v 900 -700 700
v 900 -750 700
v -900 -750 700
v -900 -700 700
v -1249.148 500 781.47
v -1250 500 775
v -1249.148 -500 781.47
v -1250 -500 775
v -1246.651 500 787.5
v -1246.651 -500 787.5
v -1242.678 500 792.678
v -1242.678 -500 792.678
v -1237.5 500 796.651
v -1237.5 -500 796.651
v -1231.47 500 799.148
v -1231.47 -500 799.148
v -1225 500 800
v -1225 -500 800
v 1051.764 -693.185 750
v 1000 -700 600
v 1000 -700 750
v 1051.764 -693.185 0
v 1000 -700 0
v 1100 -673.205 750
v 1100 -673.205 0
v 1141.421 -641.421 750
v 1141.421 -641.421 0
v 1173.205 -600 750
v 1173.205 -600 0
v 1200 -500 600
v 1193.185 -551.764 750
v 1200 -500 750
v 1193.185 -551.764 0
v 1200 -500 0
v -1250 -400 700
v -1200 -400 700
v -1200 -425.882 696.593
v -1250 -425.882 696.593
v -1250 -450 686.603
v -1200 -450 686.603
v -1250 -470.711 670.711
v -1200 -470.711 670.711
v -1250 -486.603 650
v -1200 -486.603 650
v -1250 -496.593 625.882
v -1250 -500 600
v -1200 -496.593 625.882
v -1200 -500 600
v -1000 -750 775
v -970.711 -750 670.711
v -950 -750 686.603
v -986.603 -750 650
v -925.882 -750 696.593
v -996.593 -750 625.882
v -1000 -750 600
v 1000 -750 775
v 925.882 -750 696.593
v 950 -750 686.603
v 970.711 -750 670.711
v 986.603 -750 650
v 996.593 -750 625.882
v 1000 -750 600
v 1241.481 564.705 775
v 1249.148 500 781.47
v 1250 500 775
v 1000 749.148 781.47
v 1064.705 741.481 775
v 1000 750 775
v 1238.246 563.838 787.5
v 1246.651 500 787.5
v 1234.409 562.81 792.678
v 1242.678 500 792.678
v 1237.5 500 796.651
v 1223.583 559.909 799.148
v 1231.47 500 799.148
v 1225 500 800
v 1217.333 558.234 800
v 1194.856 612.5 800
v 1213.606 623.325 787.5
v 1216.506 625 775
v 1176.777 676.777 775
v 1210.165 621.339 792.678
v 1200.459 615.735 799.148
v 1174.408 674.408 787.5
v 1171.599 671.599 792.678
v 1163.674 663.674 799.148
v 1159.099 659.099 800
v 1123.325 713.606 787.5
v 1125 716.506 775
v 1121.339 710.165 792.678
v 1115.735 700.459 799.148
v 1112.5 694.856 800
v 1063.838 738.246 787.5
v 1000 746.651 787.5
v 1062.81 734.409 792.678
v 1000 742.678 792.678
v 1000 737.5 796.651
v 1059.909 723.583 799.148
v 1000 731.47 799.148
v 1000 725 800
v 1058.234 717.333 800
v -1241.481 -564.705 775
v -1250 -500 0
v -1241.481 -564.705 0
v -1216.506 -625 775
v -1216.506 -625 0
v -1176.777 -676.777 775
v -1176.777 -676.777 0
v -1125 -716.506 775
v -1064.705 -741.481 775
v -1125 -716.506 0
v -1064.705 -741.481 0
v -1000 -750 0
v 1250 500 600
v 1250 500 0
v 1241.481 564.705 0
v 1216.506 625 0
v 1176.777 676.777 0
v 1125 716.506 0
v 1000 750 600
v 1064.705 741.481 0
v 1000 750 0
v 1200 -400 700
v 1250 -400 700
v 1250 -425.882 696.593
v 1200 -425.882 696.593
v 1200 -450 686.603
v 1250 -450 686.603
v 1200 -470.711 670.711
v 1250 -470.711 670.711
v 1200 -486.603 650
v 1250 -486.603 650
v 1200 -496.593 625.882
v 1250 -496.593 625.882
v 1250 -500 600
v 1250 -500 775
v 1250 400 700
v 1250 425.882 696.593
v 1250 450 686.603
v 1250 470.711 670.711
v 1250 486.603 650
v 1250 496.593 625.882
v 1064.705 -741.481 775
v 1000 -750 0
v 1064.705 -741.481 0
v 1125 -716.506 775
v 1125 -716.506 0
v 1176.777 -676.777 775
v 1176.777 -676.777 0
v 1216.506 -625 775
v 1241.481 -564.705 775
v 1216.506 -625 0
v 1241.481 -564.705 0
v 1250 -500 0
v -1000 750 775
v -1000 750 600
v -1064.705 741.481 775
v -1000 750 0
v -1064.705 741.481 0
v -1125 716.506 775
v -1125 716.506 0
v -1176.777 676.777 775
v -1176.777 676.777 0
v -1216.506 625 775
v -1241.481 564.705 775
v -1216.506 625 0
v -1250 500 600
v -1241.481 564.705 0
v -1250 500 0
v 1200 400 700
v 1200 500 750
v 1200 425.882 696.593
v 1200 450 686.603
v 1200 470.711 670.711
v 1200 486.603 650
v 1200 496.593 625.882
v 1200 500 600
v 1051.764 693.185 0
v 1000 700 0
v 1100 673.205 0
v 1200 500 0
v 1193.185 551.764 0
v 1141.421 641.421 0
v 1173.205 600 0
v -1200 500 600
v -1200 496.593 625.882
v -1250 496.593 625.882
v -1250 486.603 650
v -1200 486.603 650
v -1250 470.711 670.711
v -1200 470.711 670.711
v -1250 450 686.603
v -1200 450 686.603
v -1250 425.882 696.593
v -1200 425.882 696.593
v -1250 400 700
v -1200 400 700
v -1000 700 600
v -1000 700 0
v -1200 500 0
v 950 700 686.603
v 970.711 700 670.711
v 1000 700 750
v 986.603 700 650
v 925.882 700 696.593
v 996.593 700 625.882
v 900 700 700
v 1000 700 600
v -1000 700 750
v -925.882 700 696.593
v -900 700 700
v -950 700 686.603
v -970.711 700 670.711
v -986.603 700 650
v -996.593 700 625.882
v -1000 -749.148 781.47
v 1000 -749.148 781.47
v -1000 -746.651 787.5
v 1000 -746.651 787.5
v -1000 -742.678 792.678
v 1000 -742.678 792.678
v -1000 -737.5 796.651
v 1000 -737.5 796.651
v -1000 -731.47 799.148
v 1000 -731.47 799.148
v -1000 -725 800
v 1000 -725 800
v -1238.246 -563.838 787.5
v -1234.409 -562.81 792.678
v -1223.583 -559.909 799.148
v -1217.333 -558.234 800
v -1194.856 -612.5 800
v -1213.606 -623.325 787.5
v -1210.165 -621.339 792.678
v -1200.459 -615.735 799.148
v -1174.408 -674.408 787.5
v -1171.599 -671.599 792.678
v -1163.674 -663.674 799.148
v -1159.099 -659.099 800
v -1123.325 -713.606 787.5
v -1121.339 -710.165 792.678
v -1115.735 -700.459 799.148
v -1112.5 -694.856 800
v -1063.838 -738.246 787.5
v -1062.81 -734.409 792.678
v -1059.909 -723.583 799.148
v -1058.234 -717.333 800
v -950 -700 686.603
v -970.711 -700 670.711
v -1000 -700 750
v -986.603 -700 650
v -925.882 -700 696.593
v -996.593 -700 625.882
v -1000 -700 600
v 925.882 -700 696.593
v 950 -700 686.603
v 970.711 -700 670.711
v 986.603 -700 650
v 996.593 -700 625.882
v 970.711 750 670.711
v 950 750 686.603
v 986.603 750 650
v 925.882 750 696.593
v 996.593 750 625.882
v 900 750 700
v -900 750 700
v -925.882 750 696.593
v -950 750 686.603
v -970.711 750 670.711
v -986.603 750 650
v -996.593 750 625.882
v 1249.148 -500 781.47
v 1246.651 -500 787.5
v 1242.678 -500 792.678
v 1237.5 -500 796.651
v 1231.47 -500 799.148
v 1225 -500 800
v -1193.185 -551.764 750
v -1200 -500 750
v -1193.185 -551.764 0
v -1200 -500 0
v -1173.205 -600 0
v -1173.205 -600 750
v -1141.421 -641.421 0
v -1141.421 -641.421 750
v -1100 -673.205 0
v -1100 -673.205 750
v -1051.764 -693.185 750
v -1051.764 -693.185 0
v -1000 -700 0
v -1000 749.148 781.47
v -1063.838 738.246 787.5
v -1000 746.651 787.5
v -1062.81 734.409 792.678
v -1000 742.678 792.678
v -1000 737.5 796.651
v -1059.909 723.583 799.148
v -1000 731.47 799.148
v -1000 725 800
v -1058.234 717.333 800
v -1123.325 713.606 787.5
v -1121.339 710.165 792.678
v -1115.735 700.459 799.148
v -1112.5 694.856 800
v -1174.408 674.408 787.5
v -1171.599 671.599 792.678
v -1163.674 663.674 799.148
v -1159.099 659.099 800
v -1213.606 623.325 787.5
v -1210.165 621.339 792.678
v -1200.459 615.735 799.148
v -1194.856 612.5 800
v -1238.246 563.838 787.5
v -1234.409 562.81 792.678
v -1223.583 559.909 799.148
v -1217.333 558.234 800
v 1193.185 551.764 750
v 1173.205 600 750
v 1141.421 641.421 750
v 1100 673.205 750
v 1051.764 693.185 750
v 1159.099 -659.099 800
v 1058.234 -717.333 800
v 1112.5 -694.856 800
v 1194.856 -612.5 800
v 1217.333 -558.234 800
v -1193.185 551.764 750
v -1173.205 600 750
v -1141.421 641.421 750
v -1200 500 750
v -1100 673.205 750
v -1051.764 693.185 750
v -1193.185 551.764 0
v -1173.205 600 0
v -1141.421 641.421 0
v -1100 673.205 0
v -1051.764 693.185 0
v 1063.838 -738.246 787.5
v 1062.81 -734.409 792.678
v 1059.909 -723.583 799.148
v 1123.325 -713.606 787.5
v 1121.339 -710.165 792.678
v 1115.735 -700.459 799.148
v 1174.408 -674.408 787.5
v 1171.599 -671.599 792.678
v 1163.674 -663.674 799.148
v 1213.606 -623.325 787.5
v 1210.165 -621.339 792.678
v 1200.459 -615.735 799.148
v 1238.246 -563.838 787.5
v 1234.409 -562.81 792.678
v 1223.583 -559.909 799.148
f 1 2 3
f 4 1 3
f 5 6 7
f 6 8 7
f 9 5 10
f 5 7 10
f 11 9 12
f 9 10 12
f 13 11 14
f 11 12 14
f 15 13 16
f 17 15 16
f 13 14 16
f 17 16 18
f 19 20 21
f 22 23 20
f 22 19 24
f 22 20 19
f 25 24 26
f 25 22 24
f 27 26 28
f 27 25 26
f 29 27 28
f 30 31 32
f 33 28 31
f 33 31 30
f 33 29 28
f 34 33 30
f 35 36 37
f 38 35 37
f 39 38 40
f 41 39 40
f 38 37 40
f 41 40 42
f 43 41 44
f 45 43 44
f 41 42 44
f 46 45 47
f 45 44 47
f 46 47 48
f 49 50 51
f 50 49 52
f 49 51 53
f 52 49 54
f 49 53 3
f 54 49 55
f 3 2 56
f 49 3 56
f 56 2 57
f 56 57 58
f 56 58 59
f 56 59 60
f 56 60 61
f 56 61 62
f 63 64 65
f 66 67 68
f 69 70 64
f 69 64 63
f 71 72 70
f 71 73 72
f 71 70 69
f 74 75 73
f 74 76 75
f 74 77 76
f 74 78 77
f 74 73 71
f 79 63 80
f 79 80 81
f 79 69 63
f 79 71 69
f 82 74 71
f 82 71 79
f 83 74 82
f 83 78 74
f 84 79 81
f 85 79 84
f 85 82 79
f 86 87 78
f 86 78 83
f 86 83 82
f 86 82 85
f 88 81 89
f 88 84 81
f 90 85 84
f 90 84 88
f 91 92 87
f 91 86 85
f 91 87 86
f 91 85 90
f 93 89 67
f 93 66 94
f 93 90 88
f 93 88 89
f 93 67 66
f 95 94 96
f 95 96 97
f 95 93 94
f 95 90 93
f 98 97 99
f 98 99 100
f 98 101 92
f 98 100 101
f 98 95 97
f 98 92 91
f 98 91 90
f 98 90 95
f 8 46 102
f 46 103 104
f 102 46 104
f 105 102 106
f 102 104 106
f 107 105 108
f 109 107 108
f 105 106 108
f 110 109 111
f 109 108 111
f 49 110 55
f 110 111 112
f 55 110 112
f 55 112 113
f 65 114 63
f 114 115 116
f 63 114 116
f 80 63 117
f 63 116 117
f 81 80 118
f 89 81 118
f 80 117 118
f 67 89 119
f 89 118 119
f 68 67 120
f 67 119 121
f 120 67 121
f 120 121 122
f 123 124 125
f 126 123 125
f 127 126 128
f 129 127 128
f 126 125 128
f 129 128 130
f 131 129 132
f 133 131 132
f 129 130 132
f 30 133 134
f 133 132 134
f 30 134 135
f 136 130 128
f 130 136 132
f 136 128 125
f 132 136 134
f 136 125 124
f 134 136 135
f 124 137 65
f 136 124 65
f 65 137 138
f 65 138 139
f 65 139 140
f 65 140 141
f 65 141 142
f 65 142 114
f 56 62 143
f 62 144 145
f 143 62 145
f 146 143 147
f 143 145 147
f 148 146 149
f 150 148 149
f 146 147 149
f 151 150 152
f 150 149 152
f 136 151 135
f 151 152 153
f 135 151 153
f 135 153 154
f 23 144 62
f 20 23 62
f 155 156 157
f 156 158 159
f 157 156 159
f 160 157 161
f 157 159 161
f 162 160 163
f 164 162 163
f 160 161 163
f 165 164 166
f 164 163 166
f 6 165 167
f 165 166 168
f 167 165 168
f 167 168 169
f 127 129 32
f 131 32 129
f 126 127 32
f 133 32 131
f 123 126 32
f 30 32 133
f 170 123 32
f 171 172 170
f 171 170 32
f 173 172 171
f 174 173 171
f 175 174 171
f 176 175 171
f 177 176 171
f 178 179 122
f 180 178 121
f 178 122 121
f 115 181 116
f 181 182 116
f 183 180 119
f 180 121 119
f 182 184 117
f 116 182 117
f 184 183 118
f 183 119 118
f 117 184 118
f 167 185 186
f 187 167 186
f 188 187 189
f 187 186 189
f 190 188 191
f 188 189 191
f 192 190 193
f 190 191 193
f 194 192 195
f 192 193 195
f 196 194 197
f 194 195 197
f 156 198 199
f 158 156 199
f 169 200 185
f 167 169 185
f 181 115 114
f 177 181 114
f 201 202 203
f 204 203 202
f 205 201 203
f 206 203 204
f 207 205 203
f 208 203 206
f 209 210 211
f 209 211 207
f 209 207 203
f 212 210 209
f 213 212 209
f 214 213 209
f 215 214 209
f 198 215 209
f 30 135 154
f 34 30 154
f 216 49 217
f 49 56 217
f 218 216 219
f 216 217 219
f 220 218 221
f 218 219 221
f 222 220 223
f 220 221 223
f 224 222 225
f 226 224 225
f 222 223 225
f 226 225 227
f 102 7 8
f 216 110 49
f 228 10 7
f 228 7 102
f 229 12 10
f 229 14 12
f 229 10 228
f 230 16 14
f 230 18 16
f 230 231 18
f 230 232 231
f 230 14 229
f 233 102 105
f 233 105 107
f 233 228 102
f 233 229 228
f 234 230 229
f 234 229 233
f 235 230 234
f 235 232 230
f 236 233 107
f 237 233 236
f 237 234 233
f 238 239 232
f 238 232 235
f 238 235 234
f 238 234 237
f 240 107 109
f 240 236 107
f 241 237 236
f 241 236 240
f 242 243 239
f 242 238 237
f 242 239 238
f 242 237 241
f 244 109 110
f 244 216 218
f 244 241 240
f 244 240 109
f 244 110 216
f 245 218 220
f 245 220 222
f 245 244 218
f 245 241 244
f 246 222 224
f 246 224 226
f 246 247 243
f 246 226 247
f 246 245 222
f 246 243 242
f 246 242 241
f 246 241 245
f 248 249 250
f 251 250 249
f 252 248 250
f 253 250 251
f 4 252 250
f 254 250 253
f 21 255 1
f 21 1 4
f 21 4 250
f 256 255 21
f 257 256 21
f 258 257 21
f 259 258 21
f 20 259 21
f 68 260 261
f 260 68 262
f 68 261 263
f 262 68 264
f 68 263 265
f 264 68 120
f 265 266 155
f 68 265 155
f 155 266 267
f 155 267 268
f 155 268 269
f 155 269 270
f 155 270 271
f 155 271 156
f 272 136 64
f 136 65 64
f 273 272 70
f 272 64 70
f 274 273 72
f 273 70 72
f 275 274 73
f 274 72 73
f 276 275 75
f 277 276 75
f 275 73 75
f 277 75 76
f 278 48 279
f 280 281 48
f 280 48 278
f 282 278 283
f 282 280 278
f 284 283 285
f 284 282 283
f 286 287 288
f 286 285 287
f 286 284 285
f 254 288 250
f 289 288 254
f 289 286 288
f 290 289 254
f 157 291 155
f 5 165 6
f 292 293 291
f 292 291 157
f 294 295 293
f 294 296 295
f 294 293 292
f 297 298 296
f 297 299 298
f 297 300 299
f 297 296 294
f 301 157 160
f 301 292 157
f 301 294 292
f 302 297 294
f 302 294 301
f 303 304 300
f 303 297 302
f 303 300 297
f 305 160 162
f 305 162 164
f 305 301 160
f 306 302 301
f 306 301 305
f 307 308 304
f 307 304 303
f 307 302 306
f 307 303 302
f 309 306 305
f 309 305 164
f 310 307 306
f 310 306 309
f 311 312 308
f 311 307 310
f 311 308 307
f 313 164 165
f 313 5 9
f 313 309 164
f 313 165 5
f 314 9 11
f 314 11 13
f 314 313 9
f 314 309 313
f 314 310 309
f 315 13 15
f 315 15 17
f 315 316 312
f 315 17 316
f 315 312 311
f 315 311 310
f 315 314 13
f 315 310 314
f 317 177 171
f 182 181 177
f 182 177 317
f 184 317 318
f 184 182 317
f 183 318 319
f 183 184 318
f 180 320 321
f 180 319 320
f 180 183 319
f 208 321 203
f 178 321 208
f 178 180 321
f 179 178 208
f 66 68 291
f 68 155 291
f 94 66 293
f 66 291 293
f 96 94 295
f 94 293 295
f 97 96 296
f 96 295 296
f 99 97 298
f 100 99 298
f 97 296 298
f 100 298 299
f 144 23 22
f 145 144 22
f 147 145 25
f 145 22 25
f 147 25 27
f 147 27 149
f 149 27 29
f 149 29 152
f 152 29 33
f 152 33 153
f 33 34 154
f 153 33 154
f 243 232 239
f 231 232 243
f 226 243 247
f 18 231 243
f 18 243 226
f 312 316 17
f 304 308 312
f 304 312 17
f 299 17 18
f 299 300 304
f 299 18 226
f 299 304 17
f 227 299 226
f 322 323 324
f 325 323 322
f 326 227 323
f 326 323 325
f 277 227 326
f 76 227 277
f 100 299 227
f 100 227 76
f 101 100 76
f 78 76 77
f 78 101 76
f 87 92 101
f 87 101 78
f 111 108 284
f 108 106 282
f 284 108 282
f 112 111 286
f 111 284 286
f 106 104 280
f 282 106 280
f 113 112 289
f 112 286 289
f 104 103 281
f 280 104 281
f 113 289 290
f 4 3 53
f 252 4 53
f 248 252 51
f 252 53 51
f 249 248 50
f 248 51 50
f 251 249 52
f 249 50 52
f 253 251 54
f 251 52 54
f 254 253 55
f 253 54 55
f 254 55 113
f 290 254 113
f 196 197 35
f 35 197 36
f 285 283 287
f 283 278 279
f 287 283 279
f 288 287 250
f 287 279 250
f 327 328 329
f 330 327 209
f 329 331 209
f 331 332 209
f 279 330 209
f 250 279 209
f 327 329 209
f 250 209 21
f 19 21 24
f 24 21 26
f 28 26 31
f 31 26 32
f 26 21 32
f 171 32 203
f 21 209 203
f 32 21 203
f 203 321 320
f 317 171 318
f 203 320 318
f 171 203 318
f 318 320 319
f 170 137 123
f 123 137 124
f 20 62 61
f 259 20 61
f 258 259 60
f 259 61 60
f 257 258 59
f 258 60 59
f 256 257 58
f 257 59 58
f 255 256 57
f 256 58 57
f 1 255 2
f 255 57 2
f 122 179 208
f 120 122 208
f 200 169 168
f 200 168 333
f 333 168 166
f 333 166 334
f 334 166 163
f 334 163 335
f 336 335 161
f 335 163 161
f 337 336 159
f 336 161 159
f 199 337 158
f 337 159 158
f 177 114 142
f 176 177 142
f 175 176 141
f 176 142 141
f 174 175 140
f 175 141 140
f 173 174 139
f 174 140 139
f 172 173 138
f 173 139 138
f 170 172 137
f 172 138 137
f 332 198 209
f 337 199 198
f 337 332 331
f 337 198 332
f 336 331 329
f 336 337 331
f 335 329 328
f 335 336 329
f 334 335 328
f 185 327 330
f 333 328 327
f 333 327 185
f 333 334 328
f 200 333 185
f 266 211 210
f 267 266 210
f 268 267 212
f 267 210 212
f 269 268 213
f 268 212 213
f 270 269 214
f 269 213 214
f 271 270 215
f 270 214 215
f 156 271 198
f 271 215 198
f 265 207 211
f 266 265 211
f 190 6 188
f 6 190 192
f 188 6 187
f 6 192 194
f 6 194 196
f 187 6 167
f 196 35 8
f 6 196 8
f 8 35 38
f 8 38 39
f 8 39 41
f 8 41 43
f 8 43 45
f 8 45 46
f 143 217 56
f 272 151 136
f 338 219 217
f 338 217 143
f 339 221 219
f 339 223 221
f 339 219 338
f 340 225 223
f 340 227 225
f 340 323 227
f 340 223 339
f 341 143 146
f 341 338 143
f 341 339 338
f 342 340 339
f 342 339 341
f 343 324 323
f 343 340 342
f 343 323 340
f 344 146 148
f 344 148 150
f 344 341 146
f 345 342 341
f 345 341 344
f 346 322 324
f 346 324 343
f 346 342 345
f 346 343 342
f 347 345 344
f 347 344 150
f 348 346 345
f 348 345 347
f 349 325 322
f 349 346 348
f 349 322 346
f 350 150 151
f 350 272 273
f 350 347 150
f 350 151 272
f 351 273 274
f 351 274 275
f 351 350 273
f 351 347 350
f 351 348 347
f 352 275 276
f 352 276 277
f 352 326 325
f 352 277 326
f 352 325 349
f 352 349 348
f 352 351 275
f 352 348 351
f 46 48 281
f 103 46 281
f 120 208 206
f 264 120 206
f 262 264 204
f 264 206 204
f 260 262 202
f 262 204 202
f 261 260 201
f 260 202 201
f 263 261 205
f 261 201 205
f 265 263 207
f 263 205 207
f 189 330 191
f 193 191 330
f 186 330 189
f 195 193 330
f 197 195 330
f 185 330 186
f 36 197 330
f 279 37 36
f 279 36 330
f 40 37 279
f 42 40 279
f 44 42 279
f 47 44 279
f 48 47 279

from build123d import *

# Parameters (mm, degrees)
F0_R     = 50
F1_DEPTH = 800
F2_T     = -50
F4_DEPTH = 1500.001
F6_DEPTH = 2500.001
F7_R     = 25


with BuildPart() as f1:
    # F0 (on Top) → F1 (new body)
    with BuildSketch(Plane.XY):
        with BuildLine():
            Line((-1000, -750), (1000, -750))
            ThreePointArc((1000, -750), (1176.776695, -676.776695), (1250, -500))
            Line((1250, -500), (1250, 500))
            ThreePointArc((1250, 500), (1176.776695, 676.776695), (1000, 750))
            Line((1000, 750), (-1000, 750))
            ThreePointArc((-1000, 750), (-1176.776695, 676.776695), (-1250, 500))
            Line((-1250, 500), (-1250, -500))
            ThreePointArc((-1250, -500), (-1176.776695, -676.776695), (-1000, -750))
        make_face()
        with Locations((-1000, -500)):
            Circle(F0_R, mode=Mode.SUBTRACT)
        with Locations((1000, -500)):
            Circle(F0_R, mode=Mode.SUBTRACT)
        with Locations((-1000, 500)):
            Circle(F0_R, mode=Mode.SUBTRACT)
        with Locations((1000, 500)):
            Circle(F0_R, mode=Mode.SUBTRACT)
        with Locations((-1000, -500)):
            Circle(F0_R)
        with Locations((1000, -500)):
            Circle(F0_R)
        with Locations((1000, 500)):
            Circle(F0_R)
        with Locations((-1000, 500)):
            Circle(F0_R)
    extrude(amount=F1_DEPTH)

    # F2
    f2_openings = [f1.faces().sort_by_distance(p)[0] for p in [
        (0, 0, 0),
    ]]
    offset(amount=F2_T, openings=f2_openings)

    # F3 (on face) → F4 (cut, through all)
    with BuildSketch(Plane.XZ.offset(750)):
        with BuildLine():
            Line((-1000, 600), (-1000, 0))
            Line((-1000, 0), (1000, 0))
            Line((1000, 0), (1000, 600))
            ThreePointArc((1000, 600), (970.710678, 670.710678), (900, 700))
            Line((900, 700), (-900, 700))
            ThreePointArc((-900, 700), (-970.710678, 670.710678), (-1000, 600))
        make_face()
    extrude(amount=-F4_DEPTH, mode=Mode.SUBTRACT)

    # F5 (on face) → F6 (cut, through all)
    with BuildSketch(Plane.YZ.offset(1250)):
        with BuildLine():
            Line((-500, 600), (-500, 0))
            Line((-500, 0), (500, 0))
            Line((500, 0), (500, 600))
            ThreePointArc((500, 600), (470.710678, 670.710678), (400, 700))
            Line((400, 700), (-400, 700))
            ThreePointArc((-400, 700), (-470.710678, 670.710678), (-500, 600))
        make_face()
    extrude(amount=-F6_DEPTH, mode=Mode.SUBTRACT)

    # F7
    f7_edges = [f1.edges().sort_by_distance(p)[0] for p in [
        (0, -750, 800),
        (1176.776695, -676.776695, 800),
        (1250, 0, 800),
        (1176.776695, 676.776695, 800),
        (0, 750, 800),
        (-1176.776695, 676.776695, 800),
        (-1250, 0, 800),
        (-1176.776695, -676.776695, 800),
    ]]
    fillet(f7_edges, radius=F7_R)


solid = f1.part
